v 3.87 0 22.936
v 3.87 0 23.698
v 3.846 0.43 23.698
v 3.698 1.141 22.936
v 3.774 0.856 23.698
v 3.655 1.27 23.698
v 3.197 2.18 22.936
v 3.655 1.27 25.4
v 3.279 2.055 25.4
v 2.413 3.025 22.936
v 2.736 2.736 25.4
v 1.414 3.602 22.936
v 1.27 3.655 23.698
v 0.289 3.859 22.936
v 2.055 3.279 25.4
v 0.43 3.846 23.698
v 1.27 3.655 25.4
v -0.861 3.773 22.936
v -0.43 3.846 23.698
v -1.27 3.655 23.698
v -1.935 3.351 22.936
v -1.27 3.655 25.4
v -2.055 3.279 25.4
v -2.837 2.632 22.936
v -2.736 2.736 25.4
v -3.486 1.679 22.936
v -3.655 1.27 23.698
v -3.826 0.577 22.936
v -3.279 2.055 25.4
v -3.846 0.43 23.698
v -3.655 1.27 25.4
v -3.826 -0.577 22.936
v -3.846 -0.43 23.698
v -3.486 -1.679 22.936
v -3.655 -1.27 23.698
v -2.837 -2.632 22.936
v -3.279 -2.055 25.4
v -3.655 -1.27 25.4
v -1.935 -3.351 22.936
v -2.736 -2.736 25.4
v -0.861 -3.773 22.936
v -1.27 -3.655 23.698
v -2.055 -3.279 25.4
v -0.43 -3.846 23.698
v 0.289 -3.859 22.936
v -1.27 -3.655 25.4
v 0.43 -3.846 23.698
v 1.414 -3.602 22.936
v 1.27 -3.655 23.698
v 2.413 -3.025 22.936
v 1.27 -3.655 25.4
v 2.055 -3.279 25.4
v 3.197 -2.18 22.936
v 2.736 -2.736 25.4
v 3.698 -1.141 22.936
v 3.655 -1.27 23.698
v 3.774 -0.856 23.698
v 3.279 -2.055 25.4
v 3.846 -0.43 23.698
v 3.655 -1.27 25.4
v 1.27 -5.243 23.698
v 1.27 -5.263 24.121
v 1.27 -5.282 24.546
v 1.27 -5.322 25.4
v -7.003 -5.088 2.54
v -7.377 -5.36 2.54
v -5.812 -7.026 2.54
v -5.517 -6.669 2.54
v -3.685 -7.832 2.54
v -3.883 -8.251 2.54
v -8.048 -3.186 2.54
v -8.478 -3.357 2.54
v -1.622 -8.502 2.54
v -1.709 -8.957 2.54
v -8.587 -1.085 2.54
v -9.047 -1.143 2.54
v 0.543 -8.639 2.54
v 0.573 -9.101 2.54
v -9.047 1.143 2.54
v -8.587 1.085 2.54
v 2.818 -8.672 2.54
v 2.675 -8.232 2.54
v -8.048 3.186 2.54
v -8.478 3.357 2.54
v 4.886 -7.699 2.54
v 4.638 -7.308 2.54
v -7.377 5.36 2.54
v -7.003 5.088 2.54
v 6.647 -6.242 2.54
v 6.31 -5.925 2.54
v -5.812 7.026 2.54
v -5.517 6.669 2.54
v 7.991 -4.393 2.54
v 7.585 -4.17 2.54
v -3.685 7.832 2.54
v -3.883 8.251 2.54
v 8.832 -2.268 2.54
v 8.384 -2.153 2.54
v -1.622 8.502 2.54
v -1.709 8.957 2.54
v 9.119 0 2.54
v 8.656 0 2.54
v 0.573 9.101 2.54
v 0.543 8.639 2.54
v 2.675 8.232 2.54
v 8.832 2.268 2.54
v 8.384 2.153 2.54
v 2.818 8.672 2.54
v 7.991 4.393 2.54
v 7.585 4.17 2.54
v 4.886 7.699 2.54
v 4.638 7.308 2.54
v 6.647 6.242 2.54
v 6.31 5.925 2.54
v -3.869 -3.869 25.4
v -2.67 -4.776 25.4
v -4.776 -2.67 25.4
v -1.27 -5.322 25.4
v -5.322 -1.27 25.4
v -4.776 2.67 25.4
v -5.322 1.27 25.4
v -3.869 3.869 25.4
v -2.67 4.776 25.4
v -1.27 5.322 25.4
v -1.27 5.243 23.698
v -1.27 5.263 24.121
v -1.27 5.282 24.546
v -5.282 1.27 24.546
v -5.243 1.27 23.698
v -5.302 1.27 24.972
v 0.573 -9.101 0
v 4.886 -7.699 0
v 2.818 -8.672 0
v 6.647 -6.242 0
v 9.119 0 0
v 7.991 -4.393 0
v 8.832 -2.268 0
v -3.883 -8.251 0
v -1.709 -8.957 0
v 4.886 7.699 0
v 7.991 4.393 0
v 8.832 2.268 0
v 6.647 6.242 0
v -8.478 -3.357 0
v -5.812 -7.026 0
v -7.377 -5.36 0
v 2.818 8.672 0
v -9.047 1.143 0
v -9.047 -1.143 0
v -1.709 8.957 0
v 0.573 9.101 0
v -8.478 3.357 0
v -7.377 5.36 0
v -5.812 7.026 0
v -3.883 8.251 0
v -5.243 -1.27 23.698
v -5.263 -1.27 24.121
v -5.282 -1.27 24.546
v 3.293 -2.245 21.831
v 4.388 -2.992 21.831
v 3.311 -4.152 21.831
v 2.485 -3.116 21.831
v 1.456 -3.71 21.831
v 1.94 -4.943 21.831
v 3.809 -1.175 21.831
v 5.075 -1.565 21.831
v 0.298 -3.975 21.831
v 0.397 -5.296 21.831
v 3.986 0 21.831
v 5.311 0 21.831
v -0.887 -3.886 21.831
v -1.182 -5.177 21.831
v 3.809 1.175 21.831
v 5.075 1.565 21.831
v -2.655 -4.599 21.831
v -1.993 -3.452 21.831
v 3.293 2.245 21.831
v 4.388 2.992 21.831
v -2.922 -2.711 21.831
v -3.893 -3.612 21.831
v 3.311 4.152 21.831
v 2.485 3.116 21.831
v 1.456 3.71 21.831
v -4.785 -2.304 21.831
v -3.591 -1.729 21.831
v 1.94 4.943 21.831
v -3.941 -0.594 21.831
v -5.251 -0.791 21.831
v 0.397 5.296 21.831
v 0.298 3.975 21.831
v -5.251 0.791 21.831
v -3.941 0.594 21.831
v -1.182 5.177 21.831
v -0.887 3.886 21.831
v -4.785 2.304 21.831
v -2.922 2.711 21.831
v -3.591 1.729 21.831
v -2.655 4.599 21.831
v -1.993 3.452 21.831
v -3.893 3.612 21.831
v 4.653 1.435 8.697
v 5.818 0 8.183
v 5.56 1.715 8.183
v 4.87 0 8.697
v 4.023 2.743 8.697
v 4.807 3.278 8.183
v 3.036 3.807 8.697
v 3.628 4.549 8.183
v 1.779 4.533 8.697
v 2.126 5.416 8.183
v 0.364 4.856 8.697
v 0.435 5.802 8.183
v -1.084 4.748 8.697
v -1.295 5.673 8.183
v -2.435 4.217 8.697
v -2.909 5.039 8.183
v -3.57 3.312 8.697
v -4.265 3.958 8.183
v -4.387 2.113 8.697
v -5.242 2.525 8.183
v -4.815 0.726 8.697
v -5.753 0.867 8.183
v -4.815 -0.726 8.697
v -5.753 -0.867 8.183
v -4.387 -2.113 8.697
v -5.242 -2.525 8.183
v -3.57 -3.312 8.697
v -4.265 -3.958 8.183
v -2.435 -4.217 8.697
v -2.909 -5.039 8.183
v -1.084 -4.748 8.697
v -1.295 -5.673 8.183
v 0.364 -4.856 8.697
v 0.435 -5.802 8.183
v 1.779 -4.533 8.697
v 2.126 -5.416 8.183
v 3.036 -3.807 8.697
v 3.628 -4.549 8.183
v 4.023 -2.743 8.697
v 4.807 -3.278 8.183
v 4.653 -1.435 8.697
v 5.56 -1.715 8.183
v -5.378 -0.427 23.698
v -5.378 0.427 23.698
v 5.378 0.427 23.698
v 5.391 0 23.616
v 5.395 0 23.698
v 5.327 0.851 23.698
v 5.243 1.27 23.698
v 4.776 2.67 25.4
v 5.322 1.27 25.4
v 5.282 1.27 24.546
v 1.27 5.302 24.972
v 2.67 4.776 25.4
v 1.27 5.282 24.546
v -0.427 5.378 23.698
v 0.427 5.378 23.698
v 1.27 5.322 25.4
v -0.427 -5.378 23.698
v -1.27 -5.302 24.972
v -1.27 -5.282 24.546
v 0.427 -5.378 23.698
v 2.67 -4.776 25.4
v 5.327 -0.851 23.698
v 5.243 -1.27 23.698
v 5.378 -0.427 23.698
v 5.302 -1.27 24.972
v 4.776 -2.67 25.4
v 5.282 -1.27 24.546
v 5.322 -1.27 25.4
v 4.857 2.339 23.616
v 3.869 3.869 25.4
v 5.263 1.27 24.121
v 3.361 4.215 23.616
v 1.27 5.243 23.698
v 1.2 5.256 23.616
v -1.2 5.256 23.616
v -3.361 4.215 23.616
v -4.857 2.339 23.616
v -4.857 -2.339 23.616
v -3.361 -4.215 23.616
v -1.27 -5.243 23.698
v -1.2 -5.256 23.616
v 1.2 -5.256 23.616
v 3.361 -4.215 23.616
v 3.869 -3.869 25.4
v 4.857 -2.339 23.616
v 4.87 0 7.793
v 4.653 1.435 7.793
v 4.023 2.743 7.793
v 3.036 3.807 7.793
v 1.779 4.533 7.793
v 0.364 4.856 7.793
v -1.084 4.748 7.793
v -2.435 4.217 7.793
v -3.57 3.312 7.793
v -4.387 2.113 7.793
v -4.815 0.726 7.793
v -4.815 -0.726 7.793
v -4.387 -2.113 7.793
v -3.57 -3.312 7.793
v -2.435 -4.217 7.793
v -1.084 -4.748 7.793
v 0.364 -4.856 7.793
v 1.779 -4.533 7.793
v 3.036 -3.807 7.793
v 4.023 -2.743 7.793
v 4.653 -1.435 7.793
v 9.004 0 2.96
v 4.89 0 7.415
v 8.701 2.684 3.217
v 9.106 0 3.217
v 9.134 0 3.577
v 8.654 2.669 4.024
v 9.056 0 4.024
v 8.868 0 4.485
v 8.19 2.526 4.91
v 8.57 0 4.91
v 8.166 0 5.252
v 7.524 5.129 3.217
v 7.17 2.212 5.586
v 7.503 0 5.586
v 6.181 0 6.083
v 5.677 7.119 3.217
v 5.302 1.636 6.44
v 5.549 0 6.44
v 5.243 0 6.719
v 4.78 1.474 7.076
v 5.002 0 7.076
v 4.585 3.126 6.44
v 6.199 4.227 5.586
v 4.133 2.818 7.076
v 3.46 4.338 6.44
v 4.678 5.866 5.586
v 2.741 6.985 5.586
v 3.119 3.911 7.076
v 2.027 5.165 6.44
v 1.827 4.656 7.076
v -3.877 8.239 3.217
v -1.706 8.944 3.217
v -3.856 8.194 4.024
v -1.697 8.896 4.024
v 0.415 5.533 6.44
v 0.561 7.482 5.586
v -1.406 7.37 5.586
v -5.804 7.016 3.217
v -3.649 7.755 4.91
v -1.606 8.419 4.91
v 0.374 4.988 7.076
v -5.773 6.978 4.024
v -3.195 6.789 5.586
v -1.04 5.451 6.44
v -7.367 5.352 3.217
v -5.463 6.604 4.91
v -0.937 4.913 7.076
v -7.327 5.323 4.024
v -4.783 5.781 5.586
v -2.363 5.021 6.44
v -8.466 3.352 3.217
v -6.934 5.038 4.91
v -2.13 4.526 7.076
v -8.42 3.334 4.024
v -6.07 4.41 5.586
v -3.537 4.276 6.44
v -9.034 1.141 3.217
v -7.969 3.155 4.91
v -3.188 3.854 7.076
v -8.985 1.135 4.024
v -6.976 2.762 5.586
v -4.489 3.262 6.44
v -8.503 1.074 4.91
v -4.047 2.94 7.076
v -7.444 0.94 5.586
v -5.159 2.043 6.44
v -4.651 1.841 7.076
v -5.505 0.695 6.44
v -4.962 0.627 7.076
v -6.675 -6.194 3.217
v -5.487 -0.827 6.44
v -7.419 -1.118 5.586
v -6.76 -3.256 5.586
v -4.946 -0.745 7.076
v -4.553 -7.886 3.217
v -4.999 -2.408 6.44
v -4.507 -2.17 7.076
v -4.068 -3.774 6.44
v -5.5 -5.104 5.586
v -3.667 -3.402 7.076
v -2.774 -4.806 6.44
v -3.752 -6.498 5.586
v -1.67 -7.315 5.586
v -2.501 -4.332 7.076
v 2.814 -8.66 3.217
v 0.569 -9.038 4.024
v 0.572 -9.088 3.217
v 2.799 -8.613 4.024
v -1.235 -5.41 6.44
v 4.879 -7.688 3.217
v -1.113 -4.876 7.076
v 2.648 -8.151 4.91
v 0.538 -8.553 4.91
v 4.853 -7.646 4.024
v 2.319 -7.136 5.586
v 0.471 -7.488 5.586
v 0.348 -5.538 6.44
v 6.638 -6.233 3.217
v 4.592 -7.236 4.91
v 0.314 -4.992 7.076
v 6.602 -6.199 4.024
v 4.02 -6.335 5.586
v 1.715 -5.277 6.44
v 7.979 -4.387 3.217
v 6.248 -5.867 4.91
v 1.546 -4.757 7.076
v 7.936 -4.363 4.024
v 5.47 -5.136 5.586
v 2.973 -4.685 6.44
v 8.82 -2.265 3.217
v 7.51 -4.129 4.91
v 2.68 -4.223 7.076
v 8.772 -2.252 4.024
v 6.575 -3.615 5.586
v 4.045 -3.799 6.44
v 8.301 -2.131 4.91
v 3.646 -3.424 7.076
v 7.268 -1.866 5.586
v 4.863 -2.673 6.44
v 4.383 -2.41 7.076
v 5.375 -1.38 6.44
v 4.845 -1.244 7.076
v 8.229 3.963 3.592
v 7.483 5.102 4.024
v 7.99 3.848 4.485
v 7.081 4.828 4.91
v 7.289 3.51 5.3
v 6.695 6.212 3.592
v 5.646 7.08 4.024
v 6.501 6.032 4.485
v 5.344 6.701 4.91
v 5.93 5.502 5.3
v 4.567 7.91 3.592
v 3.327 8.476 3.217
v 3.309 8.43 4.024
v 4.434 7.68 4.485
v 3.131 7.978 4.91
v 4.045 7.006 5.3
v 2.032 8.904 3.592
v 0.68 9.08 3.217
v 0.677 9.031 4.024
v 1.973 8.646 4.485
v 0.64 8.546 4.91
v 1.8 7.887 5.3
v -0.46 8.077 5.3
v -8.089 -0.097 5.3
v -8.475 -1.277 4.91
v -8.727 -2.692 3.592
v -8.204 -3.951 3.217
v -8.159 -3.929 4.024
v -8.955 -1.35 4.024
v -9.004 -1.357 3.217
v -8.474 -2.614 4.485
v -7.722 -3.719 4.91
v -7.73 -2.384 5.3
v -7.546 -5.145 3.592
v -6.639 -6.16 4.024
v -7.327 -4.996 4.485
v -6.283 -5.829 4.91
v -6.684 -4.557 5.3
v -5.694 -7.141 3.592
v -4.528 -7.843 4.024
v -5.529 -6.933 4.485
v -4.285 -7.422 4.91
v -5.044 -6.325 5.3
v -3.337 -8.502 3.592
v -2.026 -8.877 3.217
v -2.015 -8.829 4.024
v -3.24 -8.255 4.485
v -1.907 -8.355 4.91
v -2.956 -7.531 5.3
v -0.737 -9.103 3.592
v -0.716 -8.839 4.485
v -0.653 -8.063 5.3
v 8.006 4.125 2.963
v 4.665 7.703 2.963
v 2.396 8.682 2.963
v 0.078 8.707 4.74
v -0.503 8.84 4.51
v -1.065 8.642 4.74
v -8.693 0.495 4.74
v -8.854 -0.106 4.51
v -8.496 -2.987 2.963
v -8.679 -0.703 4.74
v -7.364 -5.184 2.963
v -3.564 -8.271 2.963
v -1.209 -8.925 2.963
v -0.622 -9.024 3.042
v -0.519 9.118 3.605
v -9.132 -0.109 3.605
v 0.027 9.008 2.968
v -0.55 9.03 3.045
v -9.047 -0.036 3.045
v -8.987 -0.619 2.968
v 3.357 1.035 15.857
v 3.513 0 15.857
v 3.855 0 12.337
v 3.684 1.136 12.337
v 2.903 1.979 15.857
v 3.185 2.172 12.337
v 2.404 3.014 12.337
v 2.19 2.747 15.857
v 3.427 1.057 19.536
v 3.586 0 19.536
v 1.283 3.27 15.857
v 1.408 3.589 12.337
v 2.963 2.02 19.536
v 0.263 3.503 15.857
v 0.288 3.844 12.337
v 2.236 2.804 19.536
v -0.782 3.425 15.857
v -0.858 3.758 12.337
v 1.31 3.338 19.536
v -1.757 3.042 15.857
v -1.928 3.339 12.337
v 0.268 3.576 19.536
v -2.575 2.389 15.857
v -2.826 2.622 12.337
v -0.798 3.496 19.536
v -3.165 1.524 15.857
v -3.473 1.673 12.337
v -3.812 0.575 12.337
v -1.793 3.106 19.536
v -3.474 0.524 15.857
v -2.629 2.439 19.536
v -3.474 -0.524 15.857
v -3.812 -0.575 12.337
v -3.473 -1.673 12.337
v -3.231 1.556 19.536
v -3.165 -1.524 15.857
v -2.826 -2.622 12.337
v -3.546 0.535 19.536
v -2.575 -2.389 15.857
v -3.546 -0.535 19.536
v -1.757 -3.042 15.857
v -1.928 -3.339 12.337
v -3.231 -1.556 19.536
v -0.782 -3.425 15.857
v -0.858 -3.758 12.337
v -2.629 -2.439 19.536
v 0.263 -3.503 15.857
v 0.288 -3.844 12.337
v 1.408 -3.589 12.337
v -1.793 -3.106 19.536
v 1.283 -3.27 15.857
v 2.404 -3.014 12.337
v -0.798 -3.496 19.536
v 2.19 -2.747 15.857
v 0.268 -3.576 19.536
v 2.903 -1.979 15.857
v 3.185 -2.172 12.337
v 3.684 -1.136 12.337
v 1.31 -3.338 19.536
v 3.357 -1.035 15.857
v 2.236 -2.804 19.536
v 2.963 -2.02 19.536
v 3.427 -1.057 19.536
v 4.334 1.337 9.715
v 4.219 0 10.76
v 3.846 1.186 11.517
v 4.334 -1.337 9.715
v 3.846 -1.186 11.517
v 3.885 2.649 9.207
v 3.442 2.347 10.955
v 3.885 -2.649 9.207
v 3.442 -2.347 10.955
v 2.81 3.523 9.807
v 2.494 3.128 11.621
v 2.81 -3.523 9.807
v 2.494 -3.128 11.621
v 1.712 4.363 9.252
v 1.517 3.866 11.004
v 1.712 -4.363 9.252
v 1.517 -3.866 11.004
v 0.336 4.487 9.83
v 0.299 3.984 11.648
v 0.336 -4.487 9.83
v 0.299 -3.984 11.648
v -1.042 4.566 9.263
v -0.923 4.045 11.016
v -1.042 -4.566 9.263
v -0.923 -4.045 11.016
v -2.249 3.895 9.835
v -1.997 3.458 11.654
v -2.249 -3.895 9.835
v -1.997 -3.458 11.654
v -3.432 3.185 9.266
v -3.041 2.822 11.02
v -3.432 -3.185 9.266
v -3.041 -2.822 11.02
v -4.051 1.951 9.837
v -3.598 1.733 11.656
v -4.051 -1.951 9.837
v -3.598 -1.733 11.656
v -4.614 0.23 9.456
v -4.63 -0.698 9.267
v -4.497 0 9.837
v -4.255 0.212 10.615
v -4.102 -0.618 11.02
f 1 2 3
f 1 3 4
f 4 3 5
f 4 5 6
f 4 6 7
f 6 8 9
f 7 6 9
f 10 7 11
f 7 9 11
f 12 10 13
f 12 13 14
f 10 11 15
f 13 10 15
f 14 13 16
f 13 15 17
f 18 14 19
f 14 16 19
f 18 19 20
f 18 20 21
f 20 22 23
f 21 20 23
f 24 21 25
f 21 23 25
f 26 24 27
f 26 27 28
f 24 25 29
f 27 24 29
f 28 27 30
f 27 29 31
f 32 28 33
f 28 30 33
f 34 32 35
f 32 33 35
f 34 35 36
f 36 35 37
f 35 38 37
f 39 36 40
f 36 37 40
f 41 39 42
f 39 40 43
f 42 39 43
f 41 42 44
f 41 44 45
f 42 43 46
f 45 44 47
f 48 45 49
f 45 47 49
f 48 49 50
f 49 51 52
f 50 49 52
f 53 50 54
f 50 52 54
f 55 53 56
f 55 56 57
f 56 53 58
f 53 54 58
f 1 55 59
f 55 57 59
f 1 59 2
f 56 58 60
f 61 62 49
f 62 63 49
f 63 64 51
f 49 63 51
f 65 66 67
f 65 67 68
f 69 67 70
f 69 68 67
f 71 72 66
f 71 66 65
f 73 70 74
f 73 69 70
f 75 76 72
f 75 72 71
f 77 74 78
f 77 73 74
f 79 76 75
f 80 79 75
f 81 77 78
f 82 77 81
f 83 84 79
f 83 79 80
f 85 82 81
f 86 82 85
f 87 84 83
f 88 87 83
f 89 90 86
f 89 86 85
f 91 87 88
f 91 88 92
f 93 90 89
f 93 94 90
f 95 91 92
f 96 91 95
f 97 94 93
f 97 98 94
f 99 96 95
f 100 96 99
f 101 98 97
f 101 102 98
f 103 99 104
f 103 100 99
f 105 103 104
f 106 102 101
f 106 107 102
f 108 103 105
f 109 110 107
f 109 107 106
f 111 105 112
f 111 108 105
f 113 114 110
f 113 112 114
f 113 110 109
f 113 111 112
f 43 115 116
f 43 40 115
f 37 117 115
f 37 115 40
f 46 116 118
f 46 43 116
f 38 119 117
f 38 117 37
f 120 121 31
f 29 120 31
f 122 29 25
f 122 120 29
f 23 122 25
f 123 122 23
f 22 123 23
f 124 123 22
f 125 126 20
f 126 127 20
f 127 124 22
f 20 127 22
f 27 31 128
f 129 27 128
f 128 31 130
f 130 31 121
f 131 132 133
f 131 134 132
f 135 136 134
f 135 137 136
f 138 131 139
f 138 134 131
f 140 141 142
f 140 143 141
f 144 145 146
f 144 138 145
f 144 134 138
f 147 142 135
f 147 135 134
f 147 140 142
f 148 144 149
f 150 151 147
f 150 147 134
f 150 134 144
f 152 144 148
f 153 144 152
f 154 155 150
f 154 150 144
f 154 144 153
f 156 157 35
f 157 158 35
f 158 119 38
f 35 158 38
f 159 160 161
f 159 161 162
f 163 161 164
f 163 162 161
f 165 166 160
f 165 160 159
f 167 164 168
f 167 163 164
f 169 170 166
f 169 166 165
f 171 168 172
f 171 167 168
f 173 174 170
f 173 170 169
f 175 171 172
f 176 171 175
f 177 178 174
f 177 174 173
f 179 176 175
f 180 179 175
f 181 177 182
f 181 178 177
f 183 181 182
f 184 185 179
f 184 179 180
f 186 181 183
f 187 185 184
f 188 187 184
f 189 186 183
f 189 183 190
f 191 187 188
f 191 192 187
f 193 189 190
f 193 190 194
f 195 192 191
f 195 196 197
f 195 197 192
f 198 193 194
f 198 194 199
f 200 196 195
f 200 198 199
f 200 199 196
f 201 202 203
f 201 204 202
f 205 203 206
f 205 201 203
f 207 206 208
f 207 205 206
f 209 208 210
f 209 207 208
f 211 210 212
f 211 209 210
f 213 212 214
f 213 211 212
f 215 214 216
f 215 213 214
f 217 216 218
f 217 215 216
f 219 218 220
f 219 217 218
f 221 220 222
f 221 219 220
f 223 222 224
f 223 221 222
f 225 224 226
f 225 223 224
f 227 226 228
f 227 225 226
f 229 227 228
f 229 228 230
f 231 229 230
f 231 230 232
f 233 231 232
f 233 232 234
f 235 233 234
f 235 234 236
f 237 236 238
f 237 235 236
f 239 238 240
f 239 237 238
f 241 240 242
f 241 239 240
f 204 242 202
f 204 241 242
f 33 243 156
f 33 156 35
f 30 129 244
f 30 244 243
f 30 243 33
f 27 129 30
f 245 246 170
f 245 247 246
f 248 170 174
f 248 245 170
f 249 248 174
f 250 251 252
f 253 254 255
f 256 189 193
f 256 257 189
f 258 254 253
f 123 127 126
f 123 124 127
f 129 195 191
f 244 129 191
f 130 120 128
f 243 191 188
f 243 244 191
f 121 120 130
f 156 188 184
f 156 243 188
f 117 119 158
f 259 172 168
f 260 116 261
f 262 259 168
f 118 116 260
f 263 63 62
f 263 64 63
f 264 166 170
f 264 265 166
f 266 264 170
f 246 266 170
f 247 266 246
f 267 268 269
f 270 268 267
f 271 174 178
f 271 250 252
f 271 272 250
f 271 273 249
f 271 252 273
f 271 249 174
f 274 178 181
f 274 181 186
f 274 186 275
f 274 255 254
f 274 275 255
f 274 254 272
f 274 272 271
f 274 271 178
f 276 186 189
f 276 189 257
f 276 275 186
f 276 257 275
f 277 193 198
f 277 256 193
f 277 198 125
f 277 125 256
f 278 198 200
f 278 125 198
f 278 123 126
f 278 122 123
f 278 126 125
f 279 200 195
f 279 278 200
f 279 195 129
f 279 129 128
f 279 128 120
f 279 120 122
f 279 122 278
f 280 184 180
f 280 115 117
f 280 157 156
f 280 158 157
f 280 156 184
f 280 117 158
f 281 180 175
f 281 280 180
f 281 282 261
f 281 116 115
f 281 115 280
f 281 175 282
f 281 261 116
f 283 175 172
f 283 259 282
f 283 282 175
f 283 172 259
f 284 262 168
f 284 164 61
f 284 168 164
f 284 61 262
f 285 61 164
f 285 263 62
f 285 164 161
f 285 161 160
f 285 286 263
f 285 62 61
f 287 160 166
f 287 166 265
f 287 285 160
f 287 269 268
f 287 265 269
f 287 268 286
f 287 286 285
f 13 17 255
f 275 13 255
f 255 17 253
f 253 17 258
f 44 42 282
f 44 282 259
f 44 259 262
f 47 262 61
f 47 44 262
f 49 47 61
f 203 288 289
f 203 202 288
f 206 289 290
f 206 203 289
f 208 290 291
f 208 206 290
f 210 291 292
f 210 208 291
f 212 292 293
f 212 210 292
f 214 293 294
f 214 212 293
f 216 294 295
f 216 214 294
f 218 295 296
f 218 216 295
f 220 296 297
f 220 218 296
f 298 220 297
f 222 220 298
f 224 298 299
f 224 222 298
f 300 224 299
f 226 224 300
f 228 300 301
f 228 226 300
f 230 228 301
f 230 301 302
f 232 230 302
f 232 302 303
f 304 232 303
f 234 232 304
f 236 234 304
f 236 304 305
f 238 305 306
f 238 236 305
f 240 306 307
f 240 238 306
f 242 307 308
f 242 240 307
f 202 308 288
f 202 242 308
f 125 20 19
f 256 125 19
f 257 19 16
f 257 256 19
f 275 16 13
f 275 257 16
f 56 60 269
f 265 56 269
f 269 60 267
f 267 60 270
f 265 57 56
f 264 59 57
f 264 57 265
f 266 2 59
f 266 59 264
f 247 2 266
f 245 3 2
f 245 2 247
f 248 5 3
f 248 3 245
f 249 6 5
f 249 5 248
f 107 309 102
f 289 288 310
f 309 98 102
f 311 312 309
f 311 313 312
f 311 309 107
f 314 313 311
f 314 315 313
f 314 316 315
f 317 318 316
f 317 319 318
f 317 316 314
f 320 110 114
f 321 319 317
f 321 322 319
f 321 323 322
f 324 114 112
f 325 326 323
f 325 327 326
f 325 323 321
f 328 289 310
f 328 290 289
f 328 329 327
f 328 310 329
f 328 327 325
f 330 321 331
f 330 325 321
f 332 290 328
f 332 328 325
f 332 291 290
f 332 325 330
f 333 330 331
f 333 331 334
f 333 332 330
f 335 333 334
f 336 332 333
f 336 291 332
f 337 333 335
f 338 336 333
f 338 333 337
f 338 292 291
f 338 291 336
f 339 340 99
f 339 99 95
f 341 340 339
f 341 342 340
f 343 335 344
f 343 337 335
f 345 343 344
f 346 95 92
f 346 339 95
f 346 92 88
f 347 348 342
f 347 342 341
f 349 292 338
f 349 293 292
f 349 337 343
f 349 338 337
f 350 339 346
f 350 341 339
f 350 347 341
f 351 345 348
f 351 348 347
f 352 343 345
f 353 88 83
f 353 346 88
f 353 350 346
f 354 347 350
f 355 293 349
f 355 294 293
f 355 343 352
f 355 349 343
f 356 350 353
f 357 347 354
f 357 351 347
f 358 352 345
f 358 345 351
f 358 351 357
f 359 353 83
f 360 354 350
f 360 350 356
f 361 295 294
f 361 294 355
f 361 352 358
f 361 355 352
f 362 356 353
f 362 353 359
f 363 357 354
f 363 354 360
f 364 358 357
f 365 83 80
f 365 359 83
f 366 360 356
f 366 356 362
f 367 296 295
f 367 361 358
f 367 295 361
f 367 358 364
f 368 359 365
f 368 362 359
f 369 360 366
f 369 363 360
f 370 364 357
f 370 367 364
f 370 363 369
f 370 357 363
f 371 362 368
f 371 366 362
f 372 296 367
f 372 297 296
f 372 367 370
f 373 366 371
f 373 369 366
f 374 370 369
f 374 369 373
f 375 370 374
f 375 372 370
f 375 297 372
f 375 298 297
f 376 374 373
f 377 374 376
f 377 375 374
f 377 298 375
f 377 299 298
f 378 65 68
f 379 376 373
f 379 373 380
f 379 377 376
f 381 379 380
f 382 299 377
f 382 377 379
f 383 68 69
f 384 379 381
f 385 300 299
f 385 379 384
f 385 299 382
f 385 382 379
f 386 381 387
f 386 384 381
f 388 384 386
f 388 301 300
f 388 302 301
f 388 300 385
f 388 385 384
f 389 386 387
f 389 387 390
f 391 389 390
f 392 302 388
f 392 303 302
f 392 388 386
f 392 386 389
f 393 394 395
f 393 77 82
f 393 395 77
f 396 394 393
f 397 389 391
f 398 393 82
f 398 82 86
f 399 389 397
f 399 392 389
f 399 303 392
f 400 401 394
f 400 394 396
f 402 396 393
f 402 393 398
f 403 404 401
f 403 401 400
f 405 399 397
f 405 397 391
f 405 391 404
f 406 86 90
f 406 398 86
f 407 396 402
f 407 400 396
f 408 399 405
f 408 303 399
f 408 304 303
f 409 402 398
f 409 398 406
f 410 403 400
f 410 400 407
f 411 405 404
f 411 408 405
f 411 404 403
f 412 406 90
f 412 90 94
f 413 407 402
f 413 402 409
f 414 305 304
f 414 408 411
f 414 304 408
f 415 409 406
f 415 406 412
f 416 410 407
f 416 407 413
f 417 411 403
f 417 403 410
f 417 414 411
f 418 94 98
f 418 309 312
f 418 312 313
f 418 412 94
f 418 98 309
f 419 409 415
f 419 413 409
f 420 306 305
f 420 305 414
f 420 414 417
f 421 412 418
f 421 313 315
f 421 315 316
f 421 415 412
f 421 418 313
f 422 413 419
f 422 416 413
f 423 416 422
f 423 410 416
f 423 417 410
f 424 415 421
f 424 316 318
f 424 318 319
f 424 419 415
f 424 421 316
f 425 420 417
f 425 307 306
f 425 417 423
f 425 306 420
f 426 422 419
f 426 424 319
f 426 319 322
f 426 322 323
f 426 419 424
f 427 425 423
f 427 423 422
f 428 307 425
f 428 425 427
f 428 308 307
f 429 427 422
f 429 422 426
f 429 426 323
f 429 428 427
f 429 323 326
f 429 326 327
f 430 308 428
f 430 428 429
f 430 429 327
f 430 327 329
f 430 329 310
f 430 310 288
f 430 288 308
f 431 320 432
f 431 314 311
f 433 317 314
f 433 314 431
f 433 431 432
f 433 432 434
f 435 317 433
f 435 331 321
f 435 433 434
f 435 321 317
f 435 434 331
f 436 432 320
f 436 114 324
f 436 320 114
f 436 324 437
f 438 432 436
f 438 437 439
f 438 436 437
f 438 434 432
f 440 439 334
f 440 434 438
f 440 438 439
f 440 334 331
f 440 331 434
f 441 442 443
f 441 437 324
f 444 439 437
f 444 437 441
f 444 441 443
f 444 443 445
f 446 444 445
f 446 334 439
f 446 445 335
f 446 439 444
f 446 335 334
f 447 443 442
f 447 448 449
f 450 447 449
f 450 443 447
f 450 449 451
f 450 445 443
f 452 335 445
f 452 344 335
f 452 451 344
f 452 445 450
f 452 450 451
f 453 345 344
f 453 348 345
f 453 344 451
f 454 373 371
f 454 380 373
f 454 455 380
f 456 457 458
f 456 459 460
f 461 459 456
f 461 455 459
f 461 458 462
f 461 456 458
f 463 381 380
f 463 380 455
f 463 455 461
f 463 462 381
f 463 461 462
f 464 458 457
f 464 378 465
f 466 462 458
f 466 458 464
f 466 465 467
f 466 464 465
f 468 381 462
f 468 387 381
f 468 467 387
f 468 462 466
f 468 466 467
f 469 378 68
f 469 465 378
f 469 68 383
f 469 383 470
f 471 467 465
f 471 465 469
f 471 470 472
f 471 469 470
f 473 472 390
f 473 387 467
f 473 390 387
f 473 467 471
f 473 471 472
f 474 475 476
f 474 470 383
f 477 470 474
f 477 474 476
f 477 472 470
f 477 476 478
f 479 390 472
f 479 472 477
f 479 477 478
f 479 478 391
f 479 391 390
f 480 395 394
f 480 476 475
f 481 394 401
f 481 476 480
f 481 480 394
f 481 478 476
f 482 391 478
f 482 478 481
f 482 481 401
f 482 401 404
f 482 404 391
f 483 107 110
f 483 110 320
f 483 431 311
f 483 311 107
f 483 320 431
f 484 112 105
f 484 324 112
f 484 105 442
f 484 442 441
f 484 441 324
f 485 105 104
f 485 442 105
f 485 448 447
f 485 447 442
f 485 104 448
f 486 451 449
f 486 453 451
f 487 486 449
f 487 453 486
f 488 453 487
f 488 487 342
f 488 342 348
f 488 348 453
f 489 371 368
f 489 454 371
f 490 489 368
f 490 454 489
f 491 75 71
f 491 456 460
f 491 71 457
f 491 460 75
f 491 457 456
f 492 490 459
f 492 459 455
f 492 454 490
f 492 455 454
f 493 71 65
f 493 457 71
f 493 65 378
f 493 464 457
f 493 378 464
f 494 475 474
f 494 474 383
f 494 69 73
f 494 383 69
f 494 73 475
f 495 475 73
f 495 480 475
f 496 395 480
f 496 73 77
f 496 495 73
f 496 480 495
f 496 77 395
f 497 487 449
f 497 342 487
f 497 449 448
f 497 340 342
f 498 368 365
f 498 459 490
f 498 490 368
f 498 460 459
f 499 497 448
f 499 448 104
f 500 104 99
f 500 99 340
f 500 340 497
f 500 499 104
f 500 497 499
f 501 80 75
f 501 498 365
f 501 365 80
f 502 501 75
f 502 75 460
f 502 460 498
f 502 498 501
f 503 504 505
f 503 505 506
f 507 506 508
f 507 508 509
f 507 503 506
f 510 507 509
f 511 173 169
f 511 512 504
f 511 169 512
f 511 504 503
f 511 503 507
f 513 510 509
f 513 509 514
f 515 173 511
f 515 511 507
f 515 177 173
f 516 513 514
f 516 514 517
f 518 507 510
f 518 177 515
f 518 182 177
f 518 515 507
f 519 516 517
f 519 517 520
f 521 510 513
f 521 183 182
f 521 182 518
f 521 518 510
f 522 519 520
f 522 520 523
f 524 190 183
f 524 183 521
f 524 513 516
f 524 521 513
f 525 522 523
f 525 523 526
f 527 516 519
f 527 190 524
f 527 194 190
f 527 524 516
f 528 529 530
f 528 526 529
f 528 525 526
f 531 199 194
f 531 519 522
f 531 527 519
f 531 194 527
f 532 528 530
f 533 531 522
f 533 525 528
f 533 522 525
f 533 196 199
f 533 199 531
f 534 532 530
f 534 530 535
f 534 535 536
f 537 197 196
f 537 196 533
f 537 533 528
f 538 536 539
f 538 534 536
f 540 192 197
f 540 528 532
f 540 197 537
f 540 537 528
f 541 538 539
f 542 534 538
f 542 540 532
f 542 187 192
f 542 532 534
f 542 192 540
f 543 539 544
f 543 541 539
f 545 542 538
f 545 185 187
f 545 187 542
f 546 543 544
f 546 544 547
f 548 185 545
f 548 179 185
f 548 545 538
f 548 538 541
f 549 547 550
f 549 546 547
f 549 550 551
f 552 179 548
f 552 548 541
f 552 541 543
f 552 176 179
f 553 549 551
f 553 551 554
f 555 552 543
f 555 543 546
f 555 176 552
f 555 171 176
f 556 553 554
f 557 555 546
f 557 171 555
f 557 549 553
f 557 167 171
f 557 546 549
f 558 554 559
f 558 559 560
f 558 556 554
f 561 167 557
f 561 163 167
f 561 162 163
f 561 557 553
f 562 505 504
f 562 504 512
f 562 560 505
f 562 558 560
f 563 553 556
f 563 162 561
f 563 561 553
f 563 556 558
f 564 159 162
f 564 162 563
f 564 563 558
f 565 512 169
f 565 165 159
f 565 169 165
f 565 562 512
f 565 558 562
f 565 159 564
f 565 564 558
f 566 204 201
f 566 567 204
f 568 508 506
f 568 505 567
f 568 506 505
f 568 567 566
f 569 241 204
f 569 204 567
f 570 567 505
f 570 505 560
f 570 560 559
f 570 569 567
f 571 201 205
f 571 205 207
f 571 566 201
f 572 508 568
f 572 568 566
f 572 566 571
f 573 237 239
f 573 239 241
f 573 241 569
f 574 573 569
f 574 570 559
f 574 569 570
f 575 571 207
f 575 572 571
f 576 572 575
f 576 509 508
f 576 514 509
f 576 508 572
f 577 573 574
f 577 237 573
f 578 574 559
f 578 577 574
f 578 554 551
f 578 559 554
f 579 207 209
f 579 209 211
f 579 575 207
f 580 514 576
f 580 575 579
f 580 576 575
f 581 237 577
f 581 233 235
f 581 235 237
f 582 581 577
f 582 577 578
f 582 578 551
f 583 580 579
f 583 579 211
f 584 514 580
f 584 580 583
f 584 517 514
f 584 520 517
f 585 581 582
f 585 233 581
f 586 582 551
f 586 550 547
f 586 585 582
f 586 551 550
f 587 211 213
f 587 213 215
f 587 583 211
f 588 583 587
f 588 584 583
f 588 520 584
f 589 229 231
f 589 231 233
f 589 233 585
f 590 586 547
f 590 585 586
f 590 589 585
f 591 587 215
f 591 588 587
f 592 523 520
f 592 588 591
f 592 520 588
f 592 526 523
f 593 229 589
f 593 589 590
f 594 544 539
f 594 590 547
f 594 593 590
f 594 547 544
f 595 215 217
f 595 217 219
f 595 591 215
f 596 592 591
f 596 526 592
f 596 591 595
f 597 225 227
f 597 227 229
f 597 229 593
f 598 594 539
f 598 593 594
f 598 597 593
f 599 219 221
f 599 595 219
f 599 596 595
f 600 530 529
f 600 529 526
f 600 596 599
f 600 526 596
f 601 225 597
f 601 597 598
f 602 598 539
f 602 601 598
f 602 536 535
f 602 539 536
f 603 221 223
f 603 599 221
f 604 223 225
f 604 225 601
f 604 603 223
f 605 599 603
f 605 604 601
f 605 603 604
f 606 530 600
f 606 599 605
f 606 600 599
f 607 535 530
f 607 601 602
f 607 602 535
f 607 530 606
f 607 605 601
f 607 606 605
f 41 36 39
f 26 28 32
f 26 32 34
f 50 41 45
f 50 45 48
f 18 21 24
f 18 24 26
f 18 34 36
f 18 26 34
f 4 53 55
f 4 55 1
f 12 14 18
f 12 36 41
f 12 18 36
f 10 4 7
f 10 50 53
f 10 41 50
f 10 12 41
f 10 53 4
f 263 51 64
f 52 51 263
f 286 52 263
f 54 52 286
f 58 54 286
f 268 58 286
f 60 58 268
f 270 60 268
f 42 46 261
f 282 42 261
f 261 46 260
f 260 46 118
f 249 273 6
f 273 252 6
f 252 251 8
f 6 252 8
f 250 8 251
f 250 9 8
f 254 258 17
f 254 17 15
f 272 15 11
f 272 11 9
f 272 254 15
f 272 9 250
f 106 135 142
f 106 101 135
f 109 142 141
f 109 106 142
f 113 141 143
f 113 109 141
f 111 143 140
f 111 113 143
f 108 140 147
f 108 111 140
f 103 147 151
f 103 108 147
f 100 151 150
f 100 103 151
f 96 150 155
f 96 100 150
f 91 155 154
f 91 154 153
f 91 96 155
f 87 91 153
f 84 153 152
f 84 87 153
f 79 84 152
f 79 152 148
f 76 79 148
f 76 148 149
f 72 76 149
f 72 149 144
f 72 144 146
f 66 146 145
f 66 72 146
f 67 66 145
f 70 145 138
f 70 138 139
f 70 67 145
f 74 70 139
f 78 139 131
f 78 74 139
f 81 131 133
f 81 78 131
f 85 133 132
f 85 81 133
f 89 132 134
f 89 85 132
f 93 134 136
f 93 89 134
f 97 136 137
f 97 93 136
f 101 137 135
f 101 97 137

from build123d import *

# Parameters (mm, degrees)
F2_W     = 2.54
F2_H     = 2.54
F3_DEPTH = 1.7018
F4_R     = 3.8696767193
F5_DEPTH = 25.4
F6_DEPTH = 0.762


with BuildPart() as f1:
    # F0 (on Front) → F1 (revolve)
    with BuildSketch(Plane.XZ):
        Polygon((0, 2.54), (0, 0), (9.1186, 0), (9.1186, 2.54), (8.6556235328, 2.54), align=None)
        with BuildLine():
            Line((0, 8.6968354881), (0, 2.54))
            Line((0, 2.54), (8.6556235328, 2.54))
            add(Edge.make_bspline(
                [(8.6556235328, 2.54), (8.8550384762, 2.7402463297), (9.3618805952, 3.2434009078), (8.6917500556, 5.5027157982), (5.7913825103, 5.9282046951), (4.8176161945, 7.0821708068), (4.8696040176, 7.7928476967)],
                knots=[0, 0, 0, 0, 0.1745078988, 0.4312211664, 0.7434636272, 1, 1, 1, 1], degree=3))
            Line((4.8696040176, 7.7928476967), (5.8183851652, 8.18317011))
            Line((5.8183851652, 8.18317011), (4.8696040176, 8.6968354881))
            Line((4.8696040176, 8.6968354881), (0, 8.6968354881))
        make_face()
        with BuildLine():
            Line((0, 25.4), (0, 8.6968354881))
            Line((0, 8.6968354881), (4.8696040176, 8.6968354881))
            add(Edge.make_bspline(
                [(4.8696040176, 8.6968354881), (4.4544059351, 9.9683403285), (3.4997394922, 12.6262885828), (3.3990850213, 19.3145075221), (3.8213017941, 21.1251515454), (3.9858142845, 21.8313997611)],
                knots=[0, 0, 0, 0, 0.3320269683, 0.74449656, 1, 1, 1, 1], degree=3))
            Line((3.9858142845, 21.8313997611), (4.8696040176, 21.8313997611))
            Line((4.8696040176, 21.8313997611), (5.3105507867, 21.8313997611))
            Line((5.3105507867, 21.8313997611), (5.4714544566, 25.4))
            Line((5.4714544566, 25.4), (0, 25.4))
        make_face()
    revolve(axis=Axis((0, 0, 12.7), (0, 0, 1)))

    # F2 (on face) → F3 (cut)
    with BuildSketch(Plane.XY.offset(25.4)):
        with BuildLine():
            Line((-1.27, -1.27), (-1.27, 1.27))
            Line((-1.27, 1.27), (-5.3220215962, 1.27))
            ThreePointArc((-5.3220215962, 1.27), (-5.4714544566, 0), (-5.3220215962, -1.27))
            Line((-5.3220215962, -1.27), (-1.27, -1.27))
        make_face()
        with BuildLine():
            Line((5.3220215962, 1.27), (1.27, 1.27))
            Line((1.27, 1.27), (1.27, -1.27))
            Line((1.27, -1.27), (5.3220215962, -1.27))
            ThreePointArc((5.3220215962, -1.27), (5.4339678252, -0.6393805947), (5.4714544566, 0))
            ThreePointArc((5.4714544566, 0), (5.4339678252, 0.6393805947), (5.3220215962, 1.27))
        make_face()
        with BuildLine():
            Line((1.27, -5.3220215962), (1.27, -1.27))
            Line((1.27, -1.27), (-1.27, -1.27))
            Line((-1.27, -1.27), (-1.27, -5.3220215962))
            ThreePointArc((-1.27, -5.3220215962), (0, -5.4714544566), (1.27, -5.3220215962))
        make_face()
        with BuildLine():
            Line((-1.27, 1.27), (1.27, 1.27))
            Line((1.27, 1.27), (1.27, 5.3220215962))
            ThreePointArc((1.27, 5.3220215962), (0, 5.4714544566), (-1.27, 5.3220215962))
            Line((-1.27, 5.3220215962), (-1.27, 1.27))
        make_face()
        Rectangle(F2_W, F2_H)
    extrude(amount=-F3_DEPTH, mode=Mode.SUBTRACT)

    # F4 (on face) → F5 (cut)
    with BuildSketch(Plane.XY.offset(23.6982)):
        Circle(F4_R)
    extrude(amount=F5_DEPTH, mode=Mode.SUBTRACT)

    # F4 (on face) → F6 (cut)
    with BuildSketch(Plane.XY.offset(23.6982)):
        Circle(F4_R)
    extrude(amount=-F6_DEPTH, mode=Mode.SUBTRACT)


solid = f1.part
